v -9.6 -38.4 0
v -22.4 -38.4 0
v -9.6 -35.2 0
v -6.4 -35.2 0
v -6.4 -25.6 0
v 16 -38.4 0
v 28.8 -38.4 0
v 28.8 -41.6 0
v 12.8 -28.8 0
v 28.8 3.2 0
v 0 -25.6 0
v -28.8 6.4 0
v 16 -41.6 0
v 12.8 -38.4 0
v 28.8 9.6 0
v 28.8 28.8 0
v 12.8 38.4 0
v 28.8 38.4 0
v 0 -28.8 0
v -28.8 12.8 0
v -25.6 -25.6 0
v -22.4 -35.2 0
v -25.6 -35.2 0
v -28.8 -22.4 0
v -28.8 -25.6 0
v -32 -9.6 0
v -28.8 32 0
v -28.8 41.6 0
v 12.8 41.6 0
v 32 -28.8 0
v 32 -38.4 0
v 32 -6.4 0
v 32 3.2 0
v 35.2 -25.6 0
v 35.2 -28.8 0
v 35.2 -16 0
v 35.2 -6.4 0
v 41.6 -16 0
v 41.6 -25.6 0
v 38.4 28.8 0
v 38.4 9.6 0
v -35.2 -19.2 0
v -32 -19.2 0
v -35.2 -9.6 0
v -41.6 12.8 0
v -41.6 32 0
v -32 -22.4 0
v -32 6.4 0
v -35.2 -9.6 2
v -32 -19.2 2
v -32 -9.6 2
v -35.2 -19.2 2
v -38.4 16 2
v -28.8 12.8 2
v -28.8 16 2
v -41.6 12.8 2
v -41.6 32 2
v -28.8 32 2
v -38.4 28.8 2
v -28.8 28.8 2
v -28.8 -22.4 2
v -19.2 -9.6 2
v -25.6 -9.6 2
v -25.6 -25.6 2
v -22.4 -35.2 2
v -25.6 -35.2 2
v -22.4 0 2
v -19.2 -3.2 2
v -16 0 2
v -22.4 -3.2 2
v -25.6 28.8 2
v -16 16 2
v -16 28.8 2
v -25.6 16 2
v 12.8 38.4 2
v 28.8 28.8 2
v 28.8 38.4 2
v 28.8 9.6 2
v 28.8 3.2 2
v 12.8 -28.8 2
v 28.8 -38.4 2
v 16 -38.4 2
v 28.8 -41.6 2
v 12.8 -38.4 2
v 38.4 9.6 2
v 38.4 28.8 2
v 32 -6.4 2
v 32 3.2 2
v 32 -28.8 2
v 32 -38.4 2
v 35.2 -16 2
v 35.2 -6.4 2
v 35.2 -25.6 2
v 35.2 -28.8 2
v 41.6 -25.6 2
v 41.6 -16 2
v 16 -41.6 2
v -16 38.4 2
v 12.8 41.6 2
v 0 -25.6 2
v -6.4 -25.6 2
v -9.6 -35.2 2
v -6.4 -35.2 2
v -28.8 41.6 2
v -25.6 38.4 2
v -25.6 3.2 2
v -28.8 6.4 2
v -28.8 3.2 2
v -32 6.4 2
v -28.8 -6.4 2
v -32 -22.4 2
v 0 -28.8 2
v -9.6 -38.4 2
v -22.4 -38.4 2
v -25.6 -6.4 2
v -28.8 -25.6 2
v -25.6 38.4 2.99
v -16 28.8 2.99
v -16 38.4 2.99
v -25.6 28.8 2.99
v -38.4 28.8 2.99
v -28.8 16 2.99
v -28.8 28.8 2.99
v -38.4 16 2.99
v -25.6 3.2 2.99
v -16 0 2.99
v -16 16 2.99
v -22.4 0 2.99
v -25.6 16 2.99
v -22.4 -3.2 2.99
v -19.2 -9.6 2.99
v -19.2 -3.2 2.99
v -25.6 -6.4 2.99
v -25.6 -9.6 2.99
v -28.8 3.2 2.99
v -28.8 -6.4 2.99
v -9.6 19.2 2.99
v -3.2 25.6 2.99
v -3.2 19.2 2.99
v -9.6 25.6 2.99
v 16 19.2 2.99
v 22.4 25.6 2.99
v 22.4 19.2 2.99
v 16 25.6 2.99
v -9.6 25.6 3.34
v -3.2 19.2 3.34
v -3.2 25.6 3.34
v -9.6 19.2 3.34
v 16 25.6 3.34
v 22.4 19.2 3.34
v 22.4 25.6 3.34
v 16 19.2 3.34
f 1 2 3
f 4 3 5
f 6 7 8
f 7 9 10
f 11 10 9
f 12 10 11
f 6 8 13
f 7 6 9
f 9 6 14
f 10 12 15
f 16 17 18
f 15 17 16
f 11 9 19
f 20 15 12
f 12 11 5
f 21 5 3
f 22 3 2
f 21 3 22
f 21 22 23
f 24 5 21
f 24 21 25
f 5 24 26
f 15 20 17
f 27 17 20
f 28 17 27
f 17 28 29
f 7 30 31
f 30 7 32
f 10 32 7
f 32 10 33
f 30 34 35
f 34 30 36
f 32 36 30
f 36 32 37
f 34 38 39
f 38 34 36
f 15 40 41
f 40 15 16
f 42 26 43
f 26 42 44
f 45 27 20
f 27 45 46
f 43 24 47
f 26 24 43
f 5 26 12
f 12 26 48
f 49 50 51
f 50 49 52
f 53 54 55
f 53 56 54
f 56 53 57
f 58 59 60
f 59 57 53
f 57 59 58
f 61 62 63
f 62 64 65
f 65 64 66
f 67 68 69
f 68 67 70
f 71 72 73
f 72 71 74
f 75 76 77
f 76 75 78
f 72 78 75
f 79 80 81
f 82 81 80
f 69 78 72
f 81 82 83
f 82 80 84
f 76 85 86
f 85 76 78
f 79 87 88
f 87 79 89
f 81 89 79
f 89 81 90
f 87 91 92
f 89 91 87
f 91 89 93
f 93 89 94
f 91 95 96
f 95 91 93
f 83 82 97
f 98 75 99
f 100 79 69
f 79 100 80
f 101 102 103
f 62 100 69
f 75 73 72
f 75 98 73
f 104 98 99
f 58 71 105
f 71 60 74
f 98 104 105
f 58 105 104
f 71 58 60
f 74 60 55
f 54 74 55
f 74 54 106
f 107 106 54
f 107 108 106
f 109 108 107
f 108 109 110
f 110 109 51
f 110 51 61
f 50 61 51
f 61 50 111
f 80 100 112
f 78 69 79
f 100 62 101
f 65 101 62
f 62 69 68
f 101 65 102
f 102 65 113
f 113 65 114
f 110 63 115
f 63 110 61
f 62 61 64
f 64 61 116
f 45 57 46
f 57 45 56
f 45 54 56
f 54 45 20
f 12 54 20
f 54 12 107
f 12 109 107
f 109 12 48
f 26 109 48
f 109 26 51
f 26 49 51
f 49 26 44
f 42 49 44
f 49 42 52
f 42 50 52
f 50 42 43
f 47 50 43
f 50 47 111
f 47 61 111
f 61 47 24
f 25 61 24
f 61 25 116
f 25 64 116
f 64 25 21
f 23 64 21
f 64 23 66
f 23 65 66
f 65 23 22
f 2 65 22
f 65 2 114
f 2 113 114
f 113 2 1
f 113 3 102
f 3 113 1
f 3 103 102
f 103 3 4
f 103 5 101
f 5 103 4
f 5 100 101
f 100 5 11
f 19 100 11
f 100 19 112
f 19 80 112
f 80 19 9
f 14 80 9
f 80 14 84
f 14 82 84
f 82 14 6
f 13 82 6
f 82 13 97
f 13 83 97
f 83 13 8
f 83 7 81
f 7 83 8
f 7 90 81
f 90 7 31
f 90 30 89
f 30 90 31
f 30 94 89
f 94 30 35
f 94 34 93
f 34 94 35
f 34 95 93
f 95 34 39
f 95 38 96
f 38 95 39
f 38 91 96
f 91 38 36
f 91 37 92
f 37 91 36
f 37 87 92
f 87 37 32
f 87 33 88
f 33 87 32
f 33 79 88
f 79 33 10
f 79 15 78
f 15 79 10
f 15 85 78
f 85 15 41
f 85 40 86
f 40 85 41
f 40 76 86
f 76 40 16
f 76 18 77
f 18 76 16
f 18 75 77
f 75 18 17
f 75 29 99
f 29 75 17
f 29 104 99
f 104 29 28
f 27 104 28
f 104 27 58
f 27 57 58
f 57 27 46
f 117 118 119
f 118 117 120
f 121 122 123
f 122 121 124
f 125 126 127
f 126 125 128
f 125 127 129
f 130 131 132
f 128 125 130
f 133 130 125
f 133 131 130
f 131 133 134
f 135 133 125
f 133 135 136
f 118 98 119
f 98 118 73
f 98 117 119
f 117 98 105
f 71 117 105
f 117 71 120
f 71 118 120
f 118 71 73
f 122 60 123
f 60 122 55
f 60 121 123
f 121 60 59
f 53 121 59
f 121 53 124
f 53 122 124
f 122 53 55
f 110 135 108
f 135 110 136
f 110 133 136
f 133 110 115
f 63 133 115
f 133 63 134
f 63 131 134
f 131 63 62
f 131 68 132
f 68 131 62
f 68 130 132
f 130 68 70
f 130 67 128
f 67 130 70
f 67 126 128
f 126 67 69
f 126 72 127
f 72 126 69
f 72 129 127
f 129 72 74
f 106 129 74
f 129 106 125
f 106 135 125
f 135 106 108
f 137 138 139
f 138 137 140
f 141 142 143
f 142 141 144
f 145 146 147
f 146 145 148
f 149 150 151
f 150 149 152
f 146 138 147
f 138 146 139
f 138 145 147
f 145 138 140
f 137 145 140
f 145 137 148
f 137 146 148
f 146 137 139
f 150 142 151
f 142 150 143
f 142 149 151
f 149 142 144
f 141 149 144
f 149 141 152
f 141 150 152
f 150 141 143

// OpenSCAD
// Skateboard Charm - Version 002
// Reference: references/17_clawd_skateboard.png
// Changes from previous version:
// - Rebuilt as a flat pixel-art relief charm instead of a toy-like skateboard.
// - Added full white backing silhouette, orange body/shadow blocks, black eyes.
// - Replaced blue capsule deck and black wheels with maroon pixel deck and yellow wheels.

eps = 0.01;
$fn = 24;

unit = 3.2;
grid_w = 28;
grid_h = 28;

base_h = 2.0;
relief_h = 1.0;
detail_h = 1.15;

white = [1.00, 1.00, 1.00];
orange = [0.83, 0.45, 0.33];
shadow_orange = [0.70, 0.38, 0.29];
black = [0.03, 0.03, 0.03];
maroon = [0.34, 0.11, 0.19];
wheel_yellow = [0.94, 0.67, 0.33];

// Horizontal pixel runs: [x, y_from_top, width, height].
base_runs = [
    [5, 1, 13, 1],
    [5, 2, 18, 1],
    [5, 3, 18, 1],
    [1, 4, 22, 1],
    [1, 5, 25, 1],
    [1, 6, 25, 1],
    [1, 7, 25, 1],
    [1, 8, 25, 1],
    [1, 9, 25, 1],
    [5, 10, 21, 1],
    [5, 11, 18, 1],
    [4, 12, 19, 1],
    [4, 13, 20, 1],
    [4, 14, 20, 1],
    [4, 15, 20, 1],
    [4, 16, 21, 1],
    [3, 17, 22, 1],
    [3, 18, 22, 1],
    [3, 19, 24, 1],
    [4, 20, 23, 1],
    [5, 21, 22, 1],
    [6, 22, 6, 1],
    [14, 22, 11, 1],
    [6, 23, 6, 1],
    [18, 23, 6, 1],
    [6, 24, 6, 1],
    [18, 24, 6, 1],
    [7, 25, 4, 1],
    [18, 25, 6, 1],
    [19, 26, 4, 1]
];

orange_runs = [
    [9, 2, 8, 1],
    [9, 3, 13, 1],
    [9, 4, 13, 1],
    [5, 5, 17, 1],
    [5, 6, 6, 1],
    [13, 6, 6, 1],
    [21, 6, 4, 1],
    [5, 7, 6, 1],
    [13, 7, 6, 1],
    [21, 7, 4, 1],
    [5, 8, 20, 1],
    [9, 9, 16, 1],
    [9, 10, 13, 1],
    [9, 11, 13, 1],
    [9, 12, 13, 1],
    [9, 13, 13, 1],
    [10, 14, 2, 1],
    [16, 14, 7, 1],
    [10, 15, 2, 1],
    [18, 15, 2, 1],
    [21, 15, 2, 1],
    [11, 16, 2, 1],
    [18, 16, 2, 1],
    [21, 16, 2, 1],
    [11, 17, 2, 1],
    [19, 17, 2, 1],
    [22, 17, 2, 1],
    [19, 18, 2, 1],
    [22, 18, 2, 1]
];

shadow_runs = [
    [6, 2, 3, 1],
    [6, 3, 3, 1],
    [6, 4, 3, 1],
    [2, 5, 3, 1],
    [2, 6, 3, 1],
    [2, 7, 3, 1],
    [2, 8, 3, 1],
    [6, 9, 3, 1],
    [6, 10, 3, 1],
    [6, 11, 3, 1],
    [6, 12, 3, 1],
    [5, 13, 4, 1],
    [5, 14, 2, 1],
    [5, 15, 3, 1],
    [6, 16, 2, 1]
];

eye_runs = [
    [11, 6, 2, 1],
    [19, 6, 2, 1],
    [11, 7, 2, 1],
    [19, 7, 2, 1]
];

deck_runs = [
    [4, 18, 2, 1],
    [5, 19, 2, 1],
    [6, 20, 10, 1],
    [23, 20, 3, 1],
    [15, 21, 9, 1],
    [9, 22, 1, 1],
    [8, 23, 1, 1],
    [21, 23, 1, 1],
    [20, 24, 1, 1]
];

wheel_runs = [
    [8, 21, 2, 1],
    [7, 22, 2, 1],
    [10, 22, 1, 1],
    [20, 22, 2, 1],
    [7, 23, 1, 1],
    [9, 23, 2, 1],
    [19, 23, 2, 1],
    [22, 23, 1, 1],
    [8, 24, 2, 1],
    [19, 24, 1, 1],
    [21, 24, 2, 1],
    [20, 25, 2, 1]
];

module pixel_run_2d(run) {
    translate([run[0] * unit, (grid_h - run[1] - run[3]) * unit])
        square([run[2] * unit, run[3] * unit], center = false);
}

module run_layer(runs, z, h, layer_color) {
    color(layer_color)
        translate([0, 0, z])
            linear_extrude(height = h)
                union() {
                    for (run = runs)
                        pixel_run_2d(run);
                }
}

module charm() {
    translate([-grid_w * unit / 2, -grid_h * unit / 2, 0]) {
        run_layer(base_runs, 0, base_h, white);

        // Raised colored pixels sit into the backing with a tiny overlap.
        run_layer(orange_runs, base_h - eps, relief_h, orange);
        run_layer(shadow_runs, base_h - eps, relief_h, shadow_orange);
        run_layer(deck_runs, base_h - eps, detail_h, maroon);
        run_layer(wheel_runs, base_h - eps, relief_h, wheel_yellow);
        run_layer(eye_runs, base_h + relief_h - eps, 0.35, black);
    }
}

charm();
